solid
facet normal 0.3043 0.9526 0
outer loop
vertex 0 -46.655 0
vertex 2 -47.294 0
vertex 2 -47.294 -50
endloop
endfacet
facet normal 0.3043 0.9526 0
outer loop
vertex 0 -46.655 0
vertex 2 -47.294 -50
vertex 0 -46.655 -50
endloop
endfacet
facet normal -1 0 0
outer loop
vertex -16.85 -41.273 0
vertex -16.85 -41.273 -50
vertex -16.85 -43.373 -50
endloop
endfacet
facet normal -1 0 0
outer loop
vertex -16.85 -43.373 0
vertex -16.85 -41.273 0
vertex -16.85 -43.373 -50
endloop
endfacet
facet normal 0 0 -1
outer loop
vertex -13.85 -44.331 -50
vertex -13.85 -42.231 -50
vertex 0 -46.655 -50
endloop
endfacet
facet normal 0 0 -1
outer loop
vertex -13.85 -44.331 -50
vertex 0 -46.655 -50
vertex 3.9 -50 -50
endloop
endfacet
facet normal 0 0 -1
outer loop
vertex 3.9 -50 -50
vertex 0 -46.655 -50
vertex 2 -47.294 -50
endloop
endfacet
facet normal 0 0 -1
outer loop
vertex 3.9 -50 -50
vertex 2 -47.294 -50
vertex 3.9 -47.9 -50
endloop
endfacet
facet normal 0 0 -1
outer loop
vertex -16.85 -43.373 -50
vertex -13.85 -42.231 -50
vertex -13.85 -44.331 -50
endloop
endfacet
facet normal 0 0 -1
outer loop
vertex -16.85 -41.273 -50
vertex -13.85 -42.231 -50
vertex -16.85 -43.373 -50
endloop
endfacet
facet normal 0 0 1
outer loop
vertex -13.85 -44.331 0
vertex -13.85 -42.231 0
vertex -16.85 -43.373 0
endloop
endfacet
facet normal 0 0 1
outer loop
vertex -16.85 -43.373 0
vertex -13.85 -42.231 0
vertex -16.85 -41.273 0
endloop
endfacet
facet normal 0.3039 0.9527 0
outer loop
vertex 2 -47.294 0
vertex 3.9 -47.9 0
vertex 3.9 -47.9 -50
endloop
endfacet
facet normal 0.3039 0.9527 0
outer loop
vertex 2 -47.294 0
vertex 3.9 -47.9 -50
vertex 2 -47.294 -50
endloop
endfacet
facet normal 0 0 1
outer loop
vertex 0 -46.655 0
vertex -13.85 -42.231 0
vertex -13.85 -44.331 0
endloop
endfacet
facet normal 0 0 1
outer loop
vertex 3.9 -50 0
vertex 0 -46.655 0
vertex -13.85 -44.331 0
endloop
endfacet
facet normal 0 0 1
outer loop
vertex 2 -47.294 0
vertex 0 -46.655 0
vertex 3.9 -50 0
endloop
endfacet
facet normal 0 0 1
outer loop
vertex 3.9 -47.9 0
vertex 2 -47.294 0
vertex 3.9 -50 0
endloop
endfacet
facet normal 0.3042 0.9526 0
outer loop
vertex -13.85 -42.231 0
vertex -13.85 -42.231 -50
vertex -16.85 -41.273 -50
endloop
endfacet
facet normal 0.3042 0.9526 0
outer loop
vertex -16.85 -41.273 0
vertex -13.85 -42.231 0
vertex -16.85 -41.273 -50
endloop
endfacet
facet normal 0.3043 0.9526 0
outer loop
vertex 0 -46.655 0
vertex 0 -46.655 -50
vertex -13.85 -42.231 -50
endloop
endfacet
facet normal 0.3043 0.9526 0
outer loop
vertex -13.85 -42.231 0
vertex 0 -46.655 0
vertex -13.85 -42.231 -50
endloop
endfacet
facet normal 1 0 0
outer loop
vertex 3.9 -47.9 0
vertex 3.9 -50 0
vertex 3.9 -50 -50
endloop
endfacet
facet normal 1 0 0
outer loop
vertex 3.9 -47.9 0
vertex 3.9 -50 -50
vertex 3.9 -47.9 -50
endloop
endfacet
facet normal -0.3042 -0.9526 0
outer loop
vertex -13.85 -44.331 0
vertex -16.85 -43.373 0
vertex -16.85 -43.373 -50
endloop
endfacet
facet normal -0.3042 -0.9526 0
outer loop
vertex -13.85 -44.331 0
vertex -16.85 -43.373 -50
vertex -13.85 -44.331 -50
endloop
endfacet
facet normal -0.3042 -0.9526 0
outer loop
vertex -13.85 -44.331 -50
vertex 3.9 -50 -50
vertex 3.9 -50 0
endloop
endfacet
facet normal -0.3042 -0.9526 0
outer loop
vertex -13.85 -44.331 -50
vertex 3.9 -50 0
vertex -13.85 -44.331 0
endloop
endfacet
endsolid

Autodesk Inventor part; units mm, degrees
ref_plane "YZ Plane" through (0, 0, 0) normal (1, 0, 0) x (0, 1, 0)
ref_plane "XZ Plane" through (0, 0, 0) normal (0, 1, 0) x (-1, 0, 0)
ref_plane "XY Plane" through (0, 0, 0) normal (0, 0, 1) x (1, 0, 0)
sketch "Szkic1" plane through (0, 0, 0) normal (0, 0, 1) x (1, 0, 0)
  line L0 (0, -50) -> (2, -50) projected
  circle A0 centre (-3.1, -7) radius 7 projected
  line L1 (3.9, -50) -> (3.9, 0)
  line L2 (3.9, -50) -> (-19.6026, -42.4936)
  line L3 (2, -14) -> (2, -47.2936) projected
  line L4 (0, -14) -> (0, -46.6549) projected
  line L5 (3.9, -47.9005) -> (-27.3591, -37.9167)
  line L6 (-13.8397, -39.3668) -> (-13.1635, -37.9168) projected
  line L7 (-13.8397, -39.3668) -> (-13.8397, -40.8668)
  line L8 (-13.1635, -37.9168) -> (-16.1635, -37.9168)
  line L9 (-17, -41.2253) -> (-17, 0)
  line L10 (-17, 0) -> (-3.1, 0)
  line L11 (-19, -40.5865) -> (-19, 0.0005)
  line L12 (-19, 0.0005) -> (-3.1, 0.0005)
  line L13 (-3.1, -1.9995) -> (-19, -1.9995)
  line L14 (-19, -1.9995) -> (-19, 0.0005)
  line L15 (-19, -40.5865) -> (-19, -42.6861)
  line L16 (0, -14) -> (0, 0) projected
  line L17 (2, -14) -> (0, -14) projected
  line L18 (2, 0) -> (2, -14) projected
  line L19 (0, 0) -> (2, 0) projected
  line L20 (-3.1, 0) -> (0, 0)
  line L21 (-3.1, -1.9995) -> (0, -1.9995)
  line L22 (-19, 0.0005) -> (-17, 0.0005)
  line L23 (-17, 0.0005) -> (-17, -1.9995)
  line L24 (-17, -1.9995) -> (-19, -1.9995)
  line L25 (-19, -1.9995) -> (-19, 0.0005)
  dimension "d0" = 2
  dimension "d1" = 1.5
  dimension "d2" = 3
  dimension "d3" = 2
  dimension "d4" = 2
extrude "Wyciągnięcie proste1" add sketch "Szkic1" against normal blind 50 contours L1 L2 L15 L5 | L16 L21 L13 A0 | A0 L20 L16 | A0 L13 L9 L10 | L9 L13 L11 L12 | L9 L5 L11 L13 picked at (-1.3641, -1.4413)
sketch "Szkic3" plane through (0, 0, -50) normal (0, 0, -1) x (-1, 0, 0)
  line L0 (17, -1.9995) -> (17, -41.2253) projected
  line L1 (17, -41.2253) -> (-3.9, -47.9005) projected
  line L2 (-3.9, -47.9005) -> (-3.9, -50) projected
  line L3 (-3.9, -50) -> (19, -42.6861) projected
  line L4 (19, -42.6861) -> (19, 0.0005) projected
  line L5 (19, 0.0005) -> (17, 0.0005) projected
  line L6 (17, 0.0005) -> (17, 0) projected
  line L7 (17, 0) -> (0, 0) projected
  line L8 (0, 0) -> (0, -1.9995) projected
  line L9 (0, -1.9995) -> (17, -1.9995) projected
  line L10 (12.25, 0) -> (12.25, -47.2936) projected
  line L11 (12.25, -47.2936) -> (13.85, -47.2936) projected
  line L12 (13.85, 0) -> (13.85, -47.2936) projected
  line L13 (12.25, 0) -> (13.85, 0) projected
  point P0 (13.85, -42.2314)
  point P1 (13.85, -44.3309)
extrude "Wyciągnięcie proste3" cut sketch "Szkic3" against normal through all contours L9 L12 L7 L5 L4 L3 L1 L0 | L9 L10 L7 L12 | L9 L8 L7 L10
sketch "Szkic4" plane through (0, 0, -50) normal (0, 0, -1) x (-1, 0, 0)
  line L0 (13.85, -44.3309) -> (13.85, -42.2314) projected
  line L1 (13.85, -42.2314) -> (-3.9, -47.9005) projected
  line L2 (-3.9, -47.9005) -> (-3.9, -50) projected
  line L3 (-3.9, -50) -> (13.85, -44.3309) projected
  line L4 (13.85, -42.2314) -> (16.85, -41.2732)
  line L5 (16.85, -41.2732) -> (16.85, -43.3727)
  line L6 (16.85, -43.3727) -> (13.85, -44.3309)
  point P0 (0, 0)
  dimension "d12" = 3
extrude "Wyciągnięcie proste4" add sketch "Szkic4" against normal blind 50 contours L0 L4 L5 L6
properties part number "nozzz" material "Stal, węglowa"
